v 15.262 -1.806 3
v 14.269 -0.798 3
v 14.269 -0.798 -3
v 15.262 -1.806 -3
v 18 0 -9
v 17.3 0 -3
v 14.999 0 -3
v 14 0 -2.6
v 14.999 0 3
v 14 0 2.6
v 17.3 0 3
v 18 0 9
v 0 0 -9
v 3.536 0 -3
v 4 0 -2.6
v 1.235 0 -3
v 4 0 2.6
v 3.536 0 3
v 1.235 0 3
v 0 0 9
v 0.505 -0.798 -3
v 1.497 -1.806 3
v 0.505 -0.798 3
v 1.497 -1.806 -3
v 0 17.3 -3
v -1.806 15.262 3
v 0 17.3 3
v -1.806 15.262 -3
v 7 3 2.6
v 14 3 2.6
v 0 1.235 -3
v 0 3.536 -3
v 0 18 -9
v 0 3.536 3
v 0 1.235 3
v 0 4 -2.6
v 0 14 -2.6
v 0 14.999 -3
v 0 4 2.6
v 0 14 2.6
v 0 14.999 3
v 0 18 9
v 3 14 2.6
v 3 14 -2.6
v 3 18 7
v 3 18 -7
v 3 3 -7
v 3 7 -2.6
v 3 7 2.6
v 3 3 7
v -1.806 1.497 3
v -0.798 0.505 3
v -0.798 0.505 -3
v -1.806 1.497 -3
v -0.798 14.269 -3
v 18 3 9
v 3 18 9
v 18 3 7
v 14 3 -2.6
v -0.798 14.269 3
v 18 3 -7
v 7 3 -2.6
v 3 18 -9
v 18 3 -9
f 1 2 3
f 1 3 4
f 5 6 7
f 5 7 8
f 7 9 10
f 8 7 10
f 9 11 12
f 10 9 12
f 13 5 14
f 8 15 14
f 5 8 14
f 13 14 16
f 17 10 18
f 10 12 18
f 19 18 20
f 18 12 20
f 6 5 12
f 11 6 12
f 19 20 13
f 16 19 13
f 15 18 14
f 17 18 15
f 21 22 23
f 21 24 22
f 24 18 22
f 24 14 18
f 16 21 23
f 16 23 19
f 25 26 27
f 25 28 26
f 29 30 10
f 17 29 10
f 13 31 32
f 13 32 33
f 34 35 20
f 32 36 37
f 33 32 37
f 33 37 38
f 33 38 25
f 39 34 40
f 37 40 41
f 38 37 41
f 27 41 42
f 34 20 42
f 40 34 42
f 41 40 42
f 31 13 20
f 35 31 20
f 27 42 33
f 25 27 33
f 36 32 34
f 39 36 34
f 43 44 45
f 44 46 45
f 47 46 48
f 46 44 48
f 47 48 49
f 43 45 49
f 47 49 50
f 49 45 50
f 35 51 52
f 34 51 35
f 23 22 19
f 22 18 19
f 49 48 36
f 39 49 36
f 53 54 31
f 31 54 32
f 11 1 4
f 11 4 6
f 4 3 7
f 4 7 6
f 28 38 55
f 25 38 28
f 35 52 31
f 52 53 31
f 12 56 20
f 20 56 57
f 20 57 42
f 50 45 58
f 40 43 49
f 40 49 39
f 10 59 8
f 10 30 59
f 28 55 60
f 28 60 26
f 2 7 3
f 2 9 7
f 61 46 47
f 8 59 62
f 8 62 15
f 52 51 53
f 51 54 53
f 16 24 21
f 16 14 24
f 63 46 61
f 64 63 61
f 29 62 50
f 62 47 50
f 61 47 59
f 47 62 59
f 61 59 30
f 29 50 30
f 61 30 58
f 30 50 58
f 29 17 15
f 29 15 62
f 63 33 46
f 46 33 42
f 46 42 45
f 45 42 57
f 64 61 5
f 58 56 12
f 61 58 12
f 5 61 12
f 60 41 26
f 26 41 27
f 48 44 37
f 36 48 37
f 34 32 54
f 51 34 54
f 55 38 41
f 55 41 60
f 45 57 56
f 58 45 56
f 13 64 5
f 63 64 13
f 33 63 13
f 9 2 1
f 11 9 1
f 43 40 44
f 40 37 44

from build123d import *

# Parameters (mm, degrees)
BOSS_EXTRUDE1_DEPTH = 9
CUT_EXTRUDE1_DEPTH  = 7
CUT_EXTRUDE2_DEPTH  = 2.6
BOSS_EXTRUDE2_DEPTH = 3


with BuildPart() as part:
    # Sketch1 → Boss-Extrude1 (new body, symmetric)
    with BuildSketch(Plane.XY):
        Polygon((0, 0), (0, 18), (3, 18), (18, 3), (18, 0), align=None)
    extrude(amount=BOSS_EXTRUDE1_DEPTH, both=True)

    # Sketch2 → Cut-Extrude1 (cut, symmetric)
    with BuildSketch(Plane.XY):
        Polygon((3, 18), (3, 3), (18, 3), align=None)
    extrude(amount=CUT_EXTRUDE1_DEPTH, both=True, mode=Mode.SUBTRACT)

    # Sketch3 → Cut-Extrude2 (cut, symmetric)
    with BuildSketch(Plane.XY):
        Polygon((0, 14), (3, 14), (3, 7), (0, 4), align=None)
        Polygon((7, 3), (14, 3), (14, 0), (4, 0), align=None)
    extrude(amount=CUT_EXTRUDE2_DEPTH, both=True, mode=Mode.SUBTRACT)

    # Sketch4 → Boss-Extrude2 (add, symmetric)
    with BuildSketch(Plane.XY):
        Polygon((1.497483368, -1.80628538), (0.504853677, -0.797938337), (1.234750477, 0), (3.535533906, 0), align=None)
        Polygon((0, 3.535533906), (-1.80628538, 1.497483368), (-0.797938337, 0.504853677), (0, 1.234750477), align=None)
        Polygon((0, 17.3), (0, 14.999216572), (-0.797938337, 14.269319771), (-1.80628538, 15.261949462), align=None)
        Polygon((14.999216572, 0), (14.269319771, -0.797938337), (15.261949462, -1.80628538), (17.3, 0), align=None)
    extrude(amount=BOSS_EXTRUDE2_DEPTH, both=True)


solid = part.part
